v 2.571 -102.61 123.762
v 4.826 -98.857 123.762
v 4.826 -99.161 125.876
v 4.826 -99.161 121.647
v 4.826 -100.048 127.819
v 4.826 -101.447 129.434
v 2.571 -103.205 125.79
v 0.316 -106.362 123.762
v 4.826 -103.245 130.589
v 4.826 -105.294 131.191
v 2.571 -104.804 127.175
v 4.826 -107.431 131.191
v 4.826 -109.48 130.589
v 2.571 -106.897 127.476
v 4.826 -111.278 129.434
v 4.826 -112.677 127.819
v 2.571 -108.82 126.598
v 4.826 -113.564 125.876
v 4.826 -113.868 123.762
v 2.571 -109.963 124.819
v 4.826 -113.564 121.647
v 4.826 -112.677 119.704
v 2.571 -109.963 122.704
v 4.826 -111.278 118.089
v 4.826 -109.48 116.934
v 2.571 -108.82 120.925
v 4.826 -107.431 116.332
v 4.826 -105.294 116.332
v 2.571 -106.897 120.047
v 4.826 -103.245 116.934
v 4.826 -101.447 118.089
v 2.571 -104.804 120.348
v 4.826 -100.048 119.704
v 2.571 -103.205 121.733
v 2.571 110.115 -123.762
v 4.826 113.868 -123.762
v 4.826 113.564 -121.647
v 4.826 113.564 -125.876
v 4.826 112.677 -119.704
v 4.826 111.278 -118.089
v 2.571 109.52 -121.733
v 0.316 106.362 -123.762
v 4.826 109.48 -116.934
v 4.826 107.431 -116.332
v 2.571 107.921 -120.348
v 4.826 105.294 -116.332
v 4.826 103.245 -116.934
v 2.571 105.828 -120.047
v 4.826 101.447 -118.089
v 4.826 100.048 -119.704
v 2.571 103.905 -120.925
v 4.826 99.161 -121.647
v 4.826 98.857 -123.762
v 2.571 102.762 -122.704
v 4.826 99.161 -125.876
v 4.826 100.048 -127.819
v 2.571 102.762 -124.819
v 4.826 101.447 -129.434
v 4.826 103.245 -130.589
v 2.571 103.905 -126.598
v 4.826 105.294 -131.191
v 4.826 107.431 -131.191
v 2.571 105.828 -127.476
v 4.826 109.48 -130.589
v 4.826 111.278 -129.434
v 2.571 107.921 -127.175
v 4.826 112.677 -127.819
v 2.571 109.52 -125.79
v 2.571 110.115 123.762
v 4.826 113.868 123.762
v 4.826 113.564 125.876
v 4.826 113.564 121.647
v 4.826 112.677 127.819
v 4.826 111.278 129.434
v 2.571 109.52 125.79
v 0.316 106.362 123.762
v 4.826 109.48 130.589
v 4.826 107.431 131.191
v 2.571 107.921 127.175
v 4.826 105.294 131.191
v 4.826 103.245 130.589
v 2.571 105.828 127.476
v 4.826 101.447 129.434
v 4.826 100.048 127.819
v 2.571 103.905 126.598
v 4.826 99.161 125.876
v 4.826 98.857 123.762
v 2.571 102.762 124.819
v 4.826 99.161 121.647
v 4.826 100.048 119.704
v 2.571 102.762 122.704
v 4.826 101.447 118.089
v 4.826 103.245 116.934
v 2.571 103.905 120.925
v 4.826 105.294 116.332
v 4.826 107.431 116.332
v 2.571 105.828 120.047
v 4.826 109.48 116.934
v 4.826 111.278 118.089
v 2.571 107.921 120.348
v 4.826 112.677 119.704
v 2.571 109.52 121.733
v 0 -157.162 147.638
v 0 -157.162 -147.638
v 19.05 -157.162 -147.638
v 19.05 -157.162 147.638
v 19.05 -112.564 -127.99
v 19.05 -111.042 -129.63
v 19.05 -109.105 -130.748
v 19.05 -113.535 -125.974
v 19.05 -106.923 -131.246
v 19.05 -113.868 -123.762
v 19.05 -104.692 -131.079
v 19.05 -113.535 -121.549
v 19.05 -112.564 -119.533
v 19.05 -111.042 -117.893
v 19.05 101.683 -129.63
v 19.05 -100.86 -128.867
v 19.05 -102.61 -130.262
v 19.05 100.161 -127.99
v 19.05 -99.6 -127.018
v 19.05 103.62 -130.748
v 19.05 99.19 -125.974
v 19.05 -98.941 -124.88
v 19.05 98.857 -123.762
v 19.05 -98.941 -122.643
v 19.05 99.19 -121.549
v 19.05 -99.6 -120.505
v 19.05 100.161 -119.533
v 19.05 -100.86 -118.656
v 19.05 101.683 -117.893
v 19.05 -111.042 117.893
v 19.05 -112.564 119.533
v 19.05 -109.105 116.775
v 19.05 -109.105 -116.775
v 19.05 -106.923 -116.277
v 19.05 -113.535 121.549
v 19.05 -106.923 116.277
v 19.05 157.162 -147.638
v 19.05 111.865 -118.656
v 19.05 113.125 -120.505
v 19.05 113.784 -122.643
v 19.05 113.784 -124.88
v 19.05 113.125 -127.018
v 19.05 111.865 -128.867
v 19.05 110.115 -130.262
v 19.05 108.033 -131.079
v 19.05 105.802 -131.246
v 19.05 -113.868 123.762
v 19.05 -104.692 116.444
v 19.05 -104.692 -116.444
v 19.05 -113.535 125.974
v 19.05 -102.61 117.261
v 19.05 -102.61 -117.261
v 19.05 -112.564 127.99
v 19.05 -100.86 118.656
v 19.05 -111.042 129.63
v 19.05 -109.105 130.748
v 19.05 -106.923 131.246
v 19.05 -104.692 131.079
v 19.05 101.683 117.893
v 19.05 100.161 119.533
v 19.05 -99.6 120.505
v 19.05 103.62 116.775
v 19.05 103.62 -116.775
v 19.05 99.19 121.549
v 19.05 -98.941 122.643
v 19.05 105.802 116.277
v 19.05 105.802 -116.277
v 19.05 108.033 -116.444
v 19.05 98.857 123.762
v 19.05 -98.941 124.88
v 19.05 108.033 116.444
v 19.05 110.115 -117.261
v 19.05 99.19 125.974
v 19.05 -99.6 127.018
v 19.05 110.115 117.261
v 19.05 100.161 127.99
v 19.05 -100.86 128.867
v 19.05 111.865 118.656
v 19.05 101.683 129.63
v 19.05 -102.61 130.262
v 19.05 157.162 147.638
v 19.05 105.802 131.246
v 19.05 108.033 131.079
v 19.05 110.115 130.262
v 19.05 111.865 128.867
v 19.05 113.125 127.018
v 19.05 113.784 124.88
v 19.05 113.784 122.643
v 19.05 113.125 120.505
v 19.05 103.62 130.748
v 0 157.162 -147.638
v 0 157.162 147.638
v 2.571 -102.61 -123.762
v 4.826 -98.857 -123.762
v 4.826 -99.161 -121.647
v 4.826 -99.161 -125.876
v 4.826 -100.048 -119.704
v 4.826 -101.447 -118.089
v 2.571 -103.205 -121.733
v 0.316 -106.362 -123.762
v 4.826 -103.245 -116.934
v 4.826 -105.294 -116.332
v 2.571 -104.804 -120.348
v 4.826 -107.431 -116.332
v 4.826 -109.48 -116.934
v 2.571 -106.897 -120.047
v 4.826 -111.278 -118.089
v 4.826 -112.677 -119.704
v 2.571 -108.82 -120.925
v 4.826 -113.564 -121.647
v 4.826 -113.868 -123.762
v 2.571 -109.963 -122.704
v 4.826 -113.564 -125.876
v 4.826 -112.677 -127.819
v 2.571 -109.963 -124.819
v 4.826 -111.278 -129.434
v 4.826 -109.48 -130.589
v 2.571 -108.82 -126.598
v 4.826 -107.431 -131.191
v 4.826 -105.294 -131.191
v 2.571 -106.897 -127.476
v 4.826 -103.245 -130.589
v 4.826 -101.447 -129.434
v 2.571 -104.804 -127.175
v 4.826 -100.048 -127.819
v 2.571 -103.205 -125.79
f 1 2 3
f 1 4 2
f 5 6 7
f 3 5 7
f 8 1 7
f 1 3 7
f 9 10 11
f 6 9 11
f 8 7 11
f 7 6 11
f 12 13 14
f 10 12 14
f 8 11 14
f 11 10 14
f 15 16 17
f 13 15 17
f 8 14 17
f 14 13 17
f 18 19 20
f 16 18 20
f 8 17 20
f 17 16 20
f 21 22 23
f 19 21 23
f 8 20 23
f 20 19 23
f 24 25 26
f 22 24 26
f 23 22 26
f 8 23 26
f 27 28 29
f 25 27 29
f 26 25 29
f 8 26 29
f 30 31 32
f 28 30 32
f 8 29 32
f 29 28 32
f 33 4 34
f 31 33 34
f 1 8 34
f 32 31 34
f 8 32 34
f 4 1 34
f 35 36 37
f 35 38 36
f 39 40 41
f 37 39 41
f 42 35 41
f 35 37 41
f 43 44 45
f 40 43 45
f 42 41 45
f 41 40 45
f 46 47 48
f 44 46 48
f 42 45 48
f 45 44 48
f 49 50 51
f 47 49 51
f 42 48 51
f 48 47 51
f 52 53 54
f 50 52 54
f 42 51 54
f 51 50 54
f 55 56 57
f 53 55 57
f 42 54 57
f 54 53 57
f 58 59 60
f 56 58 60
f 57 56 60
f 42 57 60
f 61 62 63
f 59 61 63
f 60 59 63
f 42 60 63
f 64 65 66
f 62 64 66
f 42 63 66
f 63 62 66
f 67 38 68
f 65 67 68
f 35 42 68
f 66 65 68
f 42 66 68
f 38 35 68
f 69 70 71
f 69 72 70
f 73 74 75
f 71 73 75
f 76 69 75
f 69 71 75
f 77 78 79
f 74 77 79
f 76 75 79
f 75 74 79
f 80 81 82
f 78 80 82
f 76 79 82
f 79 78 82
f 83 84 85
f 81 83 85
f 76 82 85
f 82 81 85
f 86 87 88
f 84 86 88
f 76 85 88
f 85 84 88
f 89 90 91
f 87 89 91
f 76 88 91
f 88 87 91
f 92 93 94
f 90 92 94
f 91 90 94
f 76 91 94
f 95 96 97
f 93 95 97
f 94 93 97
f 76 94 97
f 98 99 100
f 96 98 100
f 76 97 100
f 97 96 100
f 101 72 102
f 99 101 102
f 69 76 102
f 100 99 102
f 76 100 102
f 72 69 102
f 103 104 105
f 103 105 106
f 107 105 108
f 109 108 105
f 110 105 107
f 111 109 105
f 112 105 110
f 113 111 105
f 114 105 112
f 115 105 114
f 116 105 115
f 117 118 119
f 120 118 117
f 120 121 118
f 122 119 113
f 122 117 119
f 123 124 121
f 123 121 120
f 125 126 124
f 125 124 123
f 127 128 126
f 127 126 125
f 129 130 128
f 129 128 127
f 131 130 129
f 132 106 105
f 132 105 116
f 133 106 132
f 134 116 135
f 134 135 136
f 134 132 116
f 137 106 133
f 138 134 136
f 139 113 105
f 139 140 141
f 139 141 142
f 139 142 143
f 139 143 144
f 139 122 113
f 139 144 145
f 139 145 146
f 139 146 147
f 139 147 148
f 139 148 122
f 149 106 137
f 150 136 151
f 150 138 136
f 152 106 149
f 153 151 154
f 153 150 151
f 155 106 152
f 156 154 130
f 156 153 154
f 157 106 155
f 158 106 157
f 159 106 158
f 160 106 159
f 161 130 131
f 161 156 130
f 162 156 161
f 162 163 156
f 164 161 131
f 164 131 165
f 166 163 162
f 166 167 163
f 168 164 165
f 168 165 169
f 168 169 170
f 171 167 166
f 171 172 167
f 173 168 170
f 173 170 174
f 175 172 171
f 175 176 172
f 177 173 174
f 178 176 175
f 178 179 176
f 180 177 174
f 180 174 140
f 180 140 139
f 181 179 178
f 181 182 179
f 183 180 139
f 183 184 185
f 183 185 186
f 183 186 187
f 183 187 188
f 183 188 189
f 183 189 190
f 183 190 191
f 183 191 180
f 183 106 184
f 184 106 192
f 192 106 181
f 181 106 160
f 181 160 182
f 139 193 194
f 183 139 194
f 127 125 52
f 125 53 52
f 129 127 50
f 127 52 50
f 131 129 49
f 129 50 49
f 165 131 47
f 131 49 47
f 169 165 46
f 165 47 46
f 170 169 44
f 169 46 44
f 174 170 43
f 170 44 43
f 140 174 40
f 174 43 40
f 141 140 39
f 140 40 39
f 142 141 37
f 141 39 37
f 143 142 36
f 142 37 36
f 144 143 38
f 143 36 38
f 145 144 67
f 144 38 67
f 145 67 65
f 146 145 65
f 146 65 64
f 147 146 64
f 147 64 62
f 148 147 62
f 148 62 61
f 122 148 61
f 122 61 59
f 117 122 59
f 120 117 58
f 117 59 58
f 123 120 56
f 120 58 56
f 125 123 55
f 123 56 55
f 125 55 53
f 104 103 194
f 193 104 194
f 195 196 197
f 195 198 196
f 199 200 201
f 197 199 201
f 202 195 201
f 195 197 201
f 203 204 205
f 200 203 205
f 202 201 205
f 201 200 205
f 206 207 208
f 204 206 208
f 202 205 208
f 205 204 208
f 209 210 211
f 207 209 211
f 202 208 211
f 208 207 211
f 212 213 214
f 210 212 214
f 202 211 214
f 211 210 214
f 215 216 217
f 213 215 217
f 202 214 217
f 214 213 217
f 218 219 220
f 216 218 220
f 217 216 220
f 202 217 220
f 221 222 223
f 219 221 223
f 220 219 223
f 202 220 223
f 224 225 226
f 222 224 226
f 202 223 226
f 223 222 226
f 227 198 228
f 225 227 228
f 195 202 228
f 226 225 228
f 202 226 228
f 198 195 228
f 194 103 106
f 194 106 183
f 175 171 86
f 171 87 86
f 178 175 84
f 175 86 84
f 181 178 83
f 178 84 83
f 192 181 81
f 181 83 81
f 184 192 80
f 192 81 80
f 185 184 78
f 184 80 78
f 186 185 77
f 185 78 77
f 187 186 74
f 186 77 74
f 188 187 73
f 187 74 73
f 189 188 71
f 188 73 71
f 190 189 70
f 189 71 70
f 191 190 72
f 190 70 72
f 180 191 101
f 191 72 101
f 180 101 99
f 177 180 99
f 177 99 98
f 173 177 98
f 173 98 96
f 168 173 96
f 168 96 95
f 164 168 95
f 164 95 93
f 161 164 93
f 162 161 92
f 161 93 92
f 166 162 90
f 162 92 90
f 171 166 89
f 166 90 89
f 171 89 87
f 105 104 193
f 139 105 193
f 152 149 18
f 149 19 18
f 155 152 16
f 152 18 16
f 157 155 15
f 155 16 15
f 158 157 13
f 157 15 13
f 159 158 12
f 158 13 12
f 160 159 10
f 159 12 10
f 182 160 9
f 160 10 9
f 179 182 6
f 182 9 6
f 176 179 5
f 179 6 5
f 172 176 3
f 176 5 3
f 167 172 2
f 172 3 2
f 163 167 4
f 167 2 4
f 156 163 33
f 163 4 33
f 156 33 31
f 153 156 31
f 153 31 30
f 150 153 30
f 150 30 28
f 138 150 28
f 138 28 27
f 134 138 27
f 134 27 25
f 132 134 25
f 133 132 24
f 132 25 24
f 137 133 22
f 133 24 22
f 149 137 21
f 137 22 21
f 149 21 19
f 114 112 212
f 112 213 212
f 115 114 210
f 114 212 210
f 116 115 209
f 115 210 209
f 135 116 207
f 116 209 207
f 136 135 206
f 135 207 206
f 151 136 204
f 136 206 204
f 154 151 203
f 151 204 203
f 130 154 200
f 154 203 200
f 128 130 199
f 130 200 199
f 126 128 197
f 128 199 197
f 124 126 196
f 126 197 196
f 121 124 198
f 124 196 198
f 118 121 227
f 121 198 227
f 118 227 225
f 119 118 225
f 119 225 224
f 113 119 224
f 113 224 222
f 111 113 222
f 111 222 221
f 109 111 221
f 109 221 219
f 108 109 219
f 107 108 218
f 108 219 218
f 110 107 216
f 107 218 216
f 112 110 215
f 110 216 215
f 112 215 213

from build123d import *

# Parameters (mm, degrees)
F0_W     = 314.325
F0_H     = 295.275
F1_DEPTH = 19.05
F3_D     = 15.0114
F3_DEPTH = 14.224
F3_TIP   = 4.5098795482


with BuildPart() as f1:
    # F0 (on Right) → F1 (new body)
    with BuildSketch(Plane.YZ):
        Rectangle(F0_W, F0_H)
    extrude(amount=F1_DEPTH)

    # F3
    with Locations(Plane.YZ.offset(19.05)):
        with Locations((-106.3625, 123.7615), (106.3625, 123.7615), (-106.3625, -123.7615), (106.3625, -123.7615)):
            Hole(F3_D / 2, depth=F3_DEPTH)
            with Locations((0, 0, -(F3_DEPTH + F3_TIP / 2))):  # 118° drill point
                Cone(0, F3_D / 2, F3_TIP, mode=Mode.SUBTRACT)


solid = f1.part
